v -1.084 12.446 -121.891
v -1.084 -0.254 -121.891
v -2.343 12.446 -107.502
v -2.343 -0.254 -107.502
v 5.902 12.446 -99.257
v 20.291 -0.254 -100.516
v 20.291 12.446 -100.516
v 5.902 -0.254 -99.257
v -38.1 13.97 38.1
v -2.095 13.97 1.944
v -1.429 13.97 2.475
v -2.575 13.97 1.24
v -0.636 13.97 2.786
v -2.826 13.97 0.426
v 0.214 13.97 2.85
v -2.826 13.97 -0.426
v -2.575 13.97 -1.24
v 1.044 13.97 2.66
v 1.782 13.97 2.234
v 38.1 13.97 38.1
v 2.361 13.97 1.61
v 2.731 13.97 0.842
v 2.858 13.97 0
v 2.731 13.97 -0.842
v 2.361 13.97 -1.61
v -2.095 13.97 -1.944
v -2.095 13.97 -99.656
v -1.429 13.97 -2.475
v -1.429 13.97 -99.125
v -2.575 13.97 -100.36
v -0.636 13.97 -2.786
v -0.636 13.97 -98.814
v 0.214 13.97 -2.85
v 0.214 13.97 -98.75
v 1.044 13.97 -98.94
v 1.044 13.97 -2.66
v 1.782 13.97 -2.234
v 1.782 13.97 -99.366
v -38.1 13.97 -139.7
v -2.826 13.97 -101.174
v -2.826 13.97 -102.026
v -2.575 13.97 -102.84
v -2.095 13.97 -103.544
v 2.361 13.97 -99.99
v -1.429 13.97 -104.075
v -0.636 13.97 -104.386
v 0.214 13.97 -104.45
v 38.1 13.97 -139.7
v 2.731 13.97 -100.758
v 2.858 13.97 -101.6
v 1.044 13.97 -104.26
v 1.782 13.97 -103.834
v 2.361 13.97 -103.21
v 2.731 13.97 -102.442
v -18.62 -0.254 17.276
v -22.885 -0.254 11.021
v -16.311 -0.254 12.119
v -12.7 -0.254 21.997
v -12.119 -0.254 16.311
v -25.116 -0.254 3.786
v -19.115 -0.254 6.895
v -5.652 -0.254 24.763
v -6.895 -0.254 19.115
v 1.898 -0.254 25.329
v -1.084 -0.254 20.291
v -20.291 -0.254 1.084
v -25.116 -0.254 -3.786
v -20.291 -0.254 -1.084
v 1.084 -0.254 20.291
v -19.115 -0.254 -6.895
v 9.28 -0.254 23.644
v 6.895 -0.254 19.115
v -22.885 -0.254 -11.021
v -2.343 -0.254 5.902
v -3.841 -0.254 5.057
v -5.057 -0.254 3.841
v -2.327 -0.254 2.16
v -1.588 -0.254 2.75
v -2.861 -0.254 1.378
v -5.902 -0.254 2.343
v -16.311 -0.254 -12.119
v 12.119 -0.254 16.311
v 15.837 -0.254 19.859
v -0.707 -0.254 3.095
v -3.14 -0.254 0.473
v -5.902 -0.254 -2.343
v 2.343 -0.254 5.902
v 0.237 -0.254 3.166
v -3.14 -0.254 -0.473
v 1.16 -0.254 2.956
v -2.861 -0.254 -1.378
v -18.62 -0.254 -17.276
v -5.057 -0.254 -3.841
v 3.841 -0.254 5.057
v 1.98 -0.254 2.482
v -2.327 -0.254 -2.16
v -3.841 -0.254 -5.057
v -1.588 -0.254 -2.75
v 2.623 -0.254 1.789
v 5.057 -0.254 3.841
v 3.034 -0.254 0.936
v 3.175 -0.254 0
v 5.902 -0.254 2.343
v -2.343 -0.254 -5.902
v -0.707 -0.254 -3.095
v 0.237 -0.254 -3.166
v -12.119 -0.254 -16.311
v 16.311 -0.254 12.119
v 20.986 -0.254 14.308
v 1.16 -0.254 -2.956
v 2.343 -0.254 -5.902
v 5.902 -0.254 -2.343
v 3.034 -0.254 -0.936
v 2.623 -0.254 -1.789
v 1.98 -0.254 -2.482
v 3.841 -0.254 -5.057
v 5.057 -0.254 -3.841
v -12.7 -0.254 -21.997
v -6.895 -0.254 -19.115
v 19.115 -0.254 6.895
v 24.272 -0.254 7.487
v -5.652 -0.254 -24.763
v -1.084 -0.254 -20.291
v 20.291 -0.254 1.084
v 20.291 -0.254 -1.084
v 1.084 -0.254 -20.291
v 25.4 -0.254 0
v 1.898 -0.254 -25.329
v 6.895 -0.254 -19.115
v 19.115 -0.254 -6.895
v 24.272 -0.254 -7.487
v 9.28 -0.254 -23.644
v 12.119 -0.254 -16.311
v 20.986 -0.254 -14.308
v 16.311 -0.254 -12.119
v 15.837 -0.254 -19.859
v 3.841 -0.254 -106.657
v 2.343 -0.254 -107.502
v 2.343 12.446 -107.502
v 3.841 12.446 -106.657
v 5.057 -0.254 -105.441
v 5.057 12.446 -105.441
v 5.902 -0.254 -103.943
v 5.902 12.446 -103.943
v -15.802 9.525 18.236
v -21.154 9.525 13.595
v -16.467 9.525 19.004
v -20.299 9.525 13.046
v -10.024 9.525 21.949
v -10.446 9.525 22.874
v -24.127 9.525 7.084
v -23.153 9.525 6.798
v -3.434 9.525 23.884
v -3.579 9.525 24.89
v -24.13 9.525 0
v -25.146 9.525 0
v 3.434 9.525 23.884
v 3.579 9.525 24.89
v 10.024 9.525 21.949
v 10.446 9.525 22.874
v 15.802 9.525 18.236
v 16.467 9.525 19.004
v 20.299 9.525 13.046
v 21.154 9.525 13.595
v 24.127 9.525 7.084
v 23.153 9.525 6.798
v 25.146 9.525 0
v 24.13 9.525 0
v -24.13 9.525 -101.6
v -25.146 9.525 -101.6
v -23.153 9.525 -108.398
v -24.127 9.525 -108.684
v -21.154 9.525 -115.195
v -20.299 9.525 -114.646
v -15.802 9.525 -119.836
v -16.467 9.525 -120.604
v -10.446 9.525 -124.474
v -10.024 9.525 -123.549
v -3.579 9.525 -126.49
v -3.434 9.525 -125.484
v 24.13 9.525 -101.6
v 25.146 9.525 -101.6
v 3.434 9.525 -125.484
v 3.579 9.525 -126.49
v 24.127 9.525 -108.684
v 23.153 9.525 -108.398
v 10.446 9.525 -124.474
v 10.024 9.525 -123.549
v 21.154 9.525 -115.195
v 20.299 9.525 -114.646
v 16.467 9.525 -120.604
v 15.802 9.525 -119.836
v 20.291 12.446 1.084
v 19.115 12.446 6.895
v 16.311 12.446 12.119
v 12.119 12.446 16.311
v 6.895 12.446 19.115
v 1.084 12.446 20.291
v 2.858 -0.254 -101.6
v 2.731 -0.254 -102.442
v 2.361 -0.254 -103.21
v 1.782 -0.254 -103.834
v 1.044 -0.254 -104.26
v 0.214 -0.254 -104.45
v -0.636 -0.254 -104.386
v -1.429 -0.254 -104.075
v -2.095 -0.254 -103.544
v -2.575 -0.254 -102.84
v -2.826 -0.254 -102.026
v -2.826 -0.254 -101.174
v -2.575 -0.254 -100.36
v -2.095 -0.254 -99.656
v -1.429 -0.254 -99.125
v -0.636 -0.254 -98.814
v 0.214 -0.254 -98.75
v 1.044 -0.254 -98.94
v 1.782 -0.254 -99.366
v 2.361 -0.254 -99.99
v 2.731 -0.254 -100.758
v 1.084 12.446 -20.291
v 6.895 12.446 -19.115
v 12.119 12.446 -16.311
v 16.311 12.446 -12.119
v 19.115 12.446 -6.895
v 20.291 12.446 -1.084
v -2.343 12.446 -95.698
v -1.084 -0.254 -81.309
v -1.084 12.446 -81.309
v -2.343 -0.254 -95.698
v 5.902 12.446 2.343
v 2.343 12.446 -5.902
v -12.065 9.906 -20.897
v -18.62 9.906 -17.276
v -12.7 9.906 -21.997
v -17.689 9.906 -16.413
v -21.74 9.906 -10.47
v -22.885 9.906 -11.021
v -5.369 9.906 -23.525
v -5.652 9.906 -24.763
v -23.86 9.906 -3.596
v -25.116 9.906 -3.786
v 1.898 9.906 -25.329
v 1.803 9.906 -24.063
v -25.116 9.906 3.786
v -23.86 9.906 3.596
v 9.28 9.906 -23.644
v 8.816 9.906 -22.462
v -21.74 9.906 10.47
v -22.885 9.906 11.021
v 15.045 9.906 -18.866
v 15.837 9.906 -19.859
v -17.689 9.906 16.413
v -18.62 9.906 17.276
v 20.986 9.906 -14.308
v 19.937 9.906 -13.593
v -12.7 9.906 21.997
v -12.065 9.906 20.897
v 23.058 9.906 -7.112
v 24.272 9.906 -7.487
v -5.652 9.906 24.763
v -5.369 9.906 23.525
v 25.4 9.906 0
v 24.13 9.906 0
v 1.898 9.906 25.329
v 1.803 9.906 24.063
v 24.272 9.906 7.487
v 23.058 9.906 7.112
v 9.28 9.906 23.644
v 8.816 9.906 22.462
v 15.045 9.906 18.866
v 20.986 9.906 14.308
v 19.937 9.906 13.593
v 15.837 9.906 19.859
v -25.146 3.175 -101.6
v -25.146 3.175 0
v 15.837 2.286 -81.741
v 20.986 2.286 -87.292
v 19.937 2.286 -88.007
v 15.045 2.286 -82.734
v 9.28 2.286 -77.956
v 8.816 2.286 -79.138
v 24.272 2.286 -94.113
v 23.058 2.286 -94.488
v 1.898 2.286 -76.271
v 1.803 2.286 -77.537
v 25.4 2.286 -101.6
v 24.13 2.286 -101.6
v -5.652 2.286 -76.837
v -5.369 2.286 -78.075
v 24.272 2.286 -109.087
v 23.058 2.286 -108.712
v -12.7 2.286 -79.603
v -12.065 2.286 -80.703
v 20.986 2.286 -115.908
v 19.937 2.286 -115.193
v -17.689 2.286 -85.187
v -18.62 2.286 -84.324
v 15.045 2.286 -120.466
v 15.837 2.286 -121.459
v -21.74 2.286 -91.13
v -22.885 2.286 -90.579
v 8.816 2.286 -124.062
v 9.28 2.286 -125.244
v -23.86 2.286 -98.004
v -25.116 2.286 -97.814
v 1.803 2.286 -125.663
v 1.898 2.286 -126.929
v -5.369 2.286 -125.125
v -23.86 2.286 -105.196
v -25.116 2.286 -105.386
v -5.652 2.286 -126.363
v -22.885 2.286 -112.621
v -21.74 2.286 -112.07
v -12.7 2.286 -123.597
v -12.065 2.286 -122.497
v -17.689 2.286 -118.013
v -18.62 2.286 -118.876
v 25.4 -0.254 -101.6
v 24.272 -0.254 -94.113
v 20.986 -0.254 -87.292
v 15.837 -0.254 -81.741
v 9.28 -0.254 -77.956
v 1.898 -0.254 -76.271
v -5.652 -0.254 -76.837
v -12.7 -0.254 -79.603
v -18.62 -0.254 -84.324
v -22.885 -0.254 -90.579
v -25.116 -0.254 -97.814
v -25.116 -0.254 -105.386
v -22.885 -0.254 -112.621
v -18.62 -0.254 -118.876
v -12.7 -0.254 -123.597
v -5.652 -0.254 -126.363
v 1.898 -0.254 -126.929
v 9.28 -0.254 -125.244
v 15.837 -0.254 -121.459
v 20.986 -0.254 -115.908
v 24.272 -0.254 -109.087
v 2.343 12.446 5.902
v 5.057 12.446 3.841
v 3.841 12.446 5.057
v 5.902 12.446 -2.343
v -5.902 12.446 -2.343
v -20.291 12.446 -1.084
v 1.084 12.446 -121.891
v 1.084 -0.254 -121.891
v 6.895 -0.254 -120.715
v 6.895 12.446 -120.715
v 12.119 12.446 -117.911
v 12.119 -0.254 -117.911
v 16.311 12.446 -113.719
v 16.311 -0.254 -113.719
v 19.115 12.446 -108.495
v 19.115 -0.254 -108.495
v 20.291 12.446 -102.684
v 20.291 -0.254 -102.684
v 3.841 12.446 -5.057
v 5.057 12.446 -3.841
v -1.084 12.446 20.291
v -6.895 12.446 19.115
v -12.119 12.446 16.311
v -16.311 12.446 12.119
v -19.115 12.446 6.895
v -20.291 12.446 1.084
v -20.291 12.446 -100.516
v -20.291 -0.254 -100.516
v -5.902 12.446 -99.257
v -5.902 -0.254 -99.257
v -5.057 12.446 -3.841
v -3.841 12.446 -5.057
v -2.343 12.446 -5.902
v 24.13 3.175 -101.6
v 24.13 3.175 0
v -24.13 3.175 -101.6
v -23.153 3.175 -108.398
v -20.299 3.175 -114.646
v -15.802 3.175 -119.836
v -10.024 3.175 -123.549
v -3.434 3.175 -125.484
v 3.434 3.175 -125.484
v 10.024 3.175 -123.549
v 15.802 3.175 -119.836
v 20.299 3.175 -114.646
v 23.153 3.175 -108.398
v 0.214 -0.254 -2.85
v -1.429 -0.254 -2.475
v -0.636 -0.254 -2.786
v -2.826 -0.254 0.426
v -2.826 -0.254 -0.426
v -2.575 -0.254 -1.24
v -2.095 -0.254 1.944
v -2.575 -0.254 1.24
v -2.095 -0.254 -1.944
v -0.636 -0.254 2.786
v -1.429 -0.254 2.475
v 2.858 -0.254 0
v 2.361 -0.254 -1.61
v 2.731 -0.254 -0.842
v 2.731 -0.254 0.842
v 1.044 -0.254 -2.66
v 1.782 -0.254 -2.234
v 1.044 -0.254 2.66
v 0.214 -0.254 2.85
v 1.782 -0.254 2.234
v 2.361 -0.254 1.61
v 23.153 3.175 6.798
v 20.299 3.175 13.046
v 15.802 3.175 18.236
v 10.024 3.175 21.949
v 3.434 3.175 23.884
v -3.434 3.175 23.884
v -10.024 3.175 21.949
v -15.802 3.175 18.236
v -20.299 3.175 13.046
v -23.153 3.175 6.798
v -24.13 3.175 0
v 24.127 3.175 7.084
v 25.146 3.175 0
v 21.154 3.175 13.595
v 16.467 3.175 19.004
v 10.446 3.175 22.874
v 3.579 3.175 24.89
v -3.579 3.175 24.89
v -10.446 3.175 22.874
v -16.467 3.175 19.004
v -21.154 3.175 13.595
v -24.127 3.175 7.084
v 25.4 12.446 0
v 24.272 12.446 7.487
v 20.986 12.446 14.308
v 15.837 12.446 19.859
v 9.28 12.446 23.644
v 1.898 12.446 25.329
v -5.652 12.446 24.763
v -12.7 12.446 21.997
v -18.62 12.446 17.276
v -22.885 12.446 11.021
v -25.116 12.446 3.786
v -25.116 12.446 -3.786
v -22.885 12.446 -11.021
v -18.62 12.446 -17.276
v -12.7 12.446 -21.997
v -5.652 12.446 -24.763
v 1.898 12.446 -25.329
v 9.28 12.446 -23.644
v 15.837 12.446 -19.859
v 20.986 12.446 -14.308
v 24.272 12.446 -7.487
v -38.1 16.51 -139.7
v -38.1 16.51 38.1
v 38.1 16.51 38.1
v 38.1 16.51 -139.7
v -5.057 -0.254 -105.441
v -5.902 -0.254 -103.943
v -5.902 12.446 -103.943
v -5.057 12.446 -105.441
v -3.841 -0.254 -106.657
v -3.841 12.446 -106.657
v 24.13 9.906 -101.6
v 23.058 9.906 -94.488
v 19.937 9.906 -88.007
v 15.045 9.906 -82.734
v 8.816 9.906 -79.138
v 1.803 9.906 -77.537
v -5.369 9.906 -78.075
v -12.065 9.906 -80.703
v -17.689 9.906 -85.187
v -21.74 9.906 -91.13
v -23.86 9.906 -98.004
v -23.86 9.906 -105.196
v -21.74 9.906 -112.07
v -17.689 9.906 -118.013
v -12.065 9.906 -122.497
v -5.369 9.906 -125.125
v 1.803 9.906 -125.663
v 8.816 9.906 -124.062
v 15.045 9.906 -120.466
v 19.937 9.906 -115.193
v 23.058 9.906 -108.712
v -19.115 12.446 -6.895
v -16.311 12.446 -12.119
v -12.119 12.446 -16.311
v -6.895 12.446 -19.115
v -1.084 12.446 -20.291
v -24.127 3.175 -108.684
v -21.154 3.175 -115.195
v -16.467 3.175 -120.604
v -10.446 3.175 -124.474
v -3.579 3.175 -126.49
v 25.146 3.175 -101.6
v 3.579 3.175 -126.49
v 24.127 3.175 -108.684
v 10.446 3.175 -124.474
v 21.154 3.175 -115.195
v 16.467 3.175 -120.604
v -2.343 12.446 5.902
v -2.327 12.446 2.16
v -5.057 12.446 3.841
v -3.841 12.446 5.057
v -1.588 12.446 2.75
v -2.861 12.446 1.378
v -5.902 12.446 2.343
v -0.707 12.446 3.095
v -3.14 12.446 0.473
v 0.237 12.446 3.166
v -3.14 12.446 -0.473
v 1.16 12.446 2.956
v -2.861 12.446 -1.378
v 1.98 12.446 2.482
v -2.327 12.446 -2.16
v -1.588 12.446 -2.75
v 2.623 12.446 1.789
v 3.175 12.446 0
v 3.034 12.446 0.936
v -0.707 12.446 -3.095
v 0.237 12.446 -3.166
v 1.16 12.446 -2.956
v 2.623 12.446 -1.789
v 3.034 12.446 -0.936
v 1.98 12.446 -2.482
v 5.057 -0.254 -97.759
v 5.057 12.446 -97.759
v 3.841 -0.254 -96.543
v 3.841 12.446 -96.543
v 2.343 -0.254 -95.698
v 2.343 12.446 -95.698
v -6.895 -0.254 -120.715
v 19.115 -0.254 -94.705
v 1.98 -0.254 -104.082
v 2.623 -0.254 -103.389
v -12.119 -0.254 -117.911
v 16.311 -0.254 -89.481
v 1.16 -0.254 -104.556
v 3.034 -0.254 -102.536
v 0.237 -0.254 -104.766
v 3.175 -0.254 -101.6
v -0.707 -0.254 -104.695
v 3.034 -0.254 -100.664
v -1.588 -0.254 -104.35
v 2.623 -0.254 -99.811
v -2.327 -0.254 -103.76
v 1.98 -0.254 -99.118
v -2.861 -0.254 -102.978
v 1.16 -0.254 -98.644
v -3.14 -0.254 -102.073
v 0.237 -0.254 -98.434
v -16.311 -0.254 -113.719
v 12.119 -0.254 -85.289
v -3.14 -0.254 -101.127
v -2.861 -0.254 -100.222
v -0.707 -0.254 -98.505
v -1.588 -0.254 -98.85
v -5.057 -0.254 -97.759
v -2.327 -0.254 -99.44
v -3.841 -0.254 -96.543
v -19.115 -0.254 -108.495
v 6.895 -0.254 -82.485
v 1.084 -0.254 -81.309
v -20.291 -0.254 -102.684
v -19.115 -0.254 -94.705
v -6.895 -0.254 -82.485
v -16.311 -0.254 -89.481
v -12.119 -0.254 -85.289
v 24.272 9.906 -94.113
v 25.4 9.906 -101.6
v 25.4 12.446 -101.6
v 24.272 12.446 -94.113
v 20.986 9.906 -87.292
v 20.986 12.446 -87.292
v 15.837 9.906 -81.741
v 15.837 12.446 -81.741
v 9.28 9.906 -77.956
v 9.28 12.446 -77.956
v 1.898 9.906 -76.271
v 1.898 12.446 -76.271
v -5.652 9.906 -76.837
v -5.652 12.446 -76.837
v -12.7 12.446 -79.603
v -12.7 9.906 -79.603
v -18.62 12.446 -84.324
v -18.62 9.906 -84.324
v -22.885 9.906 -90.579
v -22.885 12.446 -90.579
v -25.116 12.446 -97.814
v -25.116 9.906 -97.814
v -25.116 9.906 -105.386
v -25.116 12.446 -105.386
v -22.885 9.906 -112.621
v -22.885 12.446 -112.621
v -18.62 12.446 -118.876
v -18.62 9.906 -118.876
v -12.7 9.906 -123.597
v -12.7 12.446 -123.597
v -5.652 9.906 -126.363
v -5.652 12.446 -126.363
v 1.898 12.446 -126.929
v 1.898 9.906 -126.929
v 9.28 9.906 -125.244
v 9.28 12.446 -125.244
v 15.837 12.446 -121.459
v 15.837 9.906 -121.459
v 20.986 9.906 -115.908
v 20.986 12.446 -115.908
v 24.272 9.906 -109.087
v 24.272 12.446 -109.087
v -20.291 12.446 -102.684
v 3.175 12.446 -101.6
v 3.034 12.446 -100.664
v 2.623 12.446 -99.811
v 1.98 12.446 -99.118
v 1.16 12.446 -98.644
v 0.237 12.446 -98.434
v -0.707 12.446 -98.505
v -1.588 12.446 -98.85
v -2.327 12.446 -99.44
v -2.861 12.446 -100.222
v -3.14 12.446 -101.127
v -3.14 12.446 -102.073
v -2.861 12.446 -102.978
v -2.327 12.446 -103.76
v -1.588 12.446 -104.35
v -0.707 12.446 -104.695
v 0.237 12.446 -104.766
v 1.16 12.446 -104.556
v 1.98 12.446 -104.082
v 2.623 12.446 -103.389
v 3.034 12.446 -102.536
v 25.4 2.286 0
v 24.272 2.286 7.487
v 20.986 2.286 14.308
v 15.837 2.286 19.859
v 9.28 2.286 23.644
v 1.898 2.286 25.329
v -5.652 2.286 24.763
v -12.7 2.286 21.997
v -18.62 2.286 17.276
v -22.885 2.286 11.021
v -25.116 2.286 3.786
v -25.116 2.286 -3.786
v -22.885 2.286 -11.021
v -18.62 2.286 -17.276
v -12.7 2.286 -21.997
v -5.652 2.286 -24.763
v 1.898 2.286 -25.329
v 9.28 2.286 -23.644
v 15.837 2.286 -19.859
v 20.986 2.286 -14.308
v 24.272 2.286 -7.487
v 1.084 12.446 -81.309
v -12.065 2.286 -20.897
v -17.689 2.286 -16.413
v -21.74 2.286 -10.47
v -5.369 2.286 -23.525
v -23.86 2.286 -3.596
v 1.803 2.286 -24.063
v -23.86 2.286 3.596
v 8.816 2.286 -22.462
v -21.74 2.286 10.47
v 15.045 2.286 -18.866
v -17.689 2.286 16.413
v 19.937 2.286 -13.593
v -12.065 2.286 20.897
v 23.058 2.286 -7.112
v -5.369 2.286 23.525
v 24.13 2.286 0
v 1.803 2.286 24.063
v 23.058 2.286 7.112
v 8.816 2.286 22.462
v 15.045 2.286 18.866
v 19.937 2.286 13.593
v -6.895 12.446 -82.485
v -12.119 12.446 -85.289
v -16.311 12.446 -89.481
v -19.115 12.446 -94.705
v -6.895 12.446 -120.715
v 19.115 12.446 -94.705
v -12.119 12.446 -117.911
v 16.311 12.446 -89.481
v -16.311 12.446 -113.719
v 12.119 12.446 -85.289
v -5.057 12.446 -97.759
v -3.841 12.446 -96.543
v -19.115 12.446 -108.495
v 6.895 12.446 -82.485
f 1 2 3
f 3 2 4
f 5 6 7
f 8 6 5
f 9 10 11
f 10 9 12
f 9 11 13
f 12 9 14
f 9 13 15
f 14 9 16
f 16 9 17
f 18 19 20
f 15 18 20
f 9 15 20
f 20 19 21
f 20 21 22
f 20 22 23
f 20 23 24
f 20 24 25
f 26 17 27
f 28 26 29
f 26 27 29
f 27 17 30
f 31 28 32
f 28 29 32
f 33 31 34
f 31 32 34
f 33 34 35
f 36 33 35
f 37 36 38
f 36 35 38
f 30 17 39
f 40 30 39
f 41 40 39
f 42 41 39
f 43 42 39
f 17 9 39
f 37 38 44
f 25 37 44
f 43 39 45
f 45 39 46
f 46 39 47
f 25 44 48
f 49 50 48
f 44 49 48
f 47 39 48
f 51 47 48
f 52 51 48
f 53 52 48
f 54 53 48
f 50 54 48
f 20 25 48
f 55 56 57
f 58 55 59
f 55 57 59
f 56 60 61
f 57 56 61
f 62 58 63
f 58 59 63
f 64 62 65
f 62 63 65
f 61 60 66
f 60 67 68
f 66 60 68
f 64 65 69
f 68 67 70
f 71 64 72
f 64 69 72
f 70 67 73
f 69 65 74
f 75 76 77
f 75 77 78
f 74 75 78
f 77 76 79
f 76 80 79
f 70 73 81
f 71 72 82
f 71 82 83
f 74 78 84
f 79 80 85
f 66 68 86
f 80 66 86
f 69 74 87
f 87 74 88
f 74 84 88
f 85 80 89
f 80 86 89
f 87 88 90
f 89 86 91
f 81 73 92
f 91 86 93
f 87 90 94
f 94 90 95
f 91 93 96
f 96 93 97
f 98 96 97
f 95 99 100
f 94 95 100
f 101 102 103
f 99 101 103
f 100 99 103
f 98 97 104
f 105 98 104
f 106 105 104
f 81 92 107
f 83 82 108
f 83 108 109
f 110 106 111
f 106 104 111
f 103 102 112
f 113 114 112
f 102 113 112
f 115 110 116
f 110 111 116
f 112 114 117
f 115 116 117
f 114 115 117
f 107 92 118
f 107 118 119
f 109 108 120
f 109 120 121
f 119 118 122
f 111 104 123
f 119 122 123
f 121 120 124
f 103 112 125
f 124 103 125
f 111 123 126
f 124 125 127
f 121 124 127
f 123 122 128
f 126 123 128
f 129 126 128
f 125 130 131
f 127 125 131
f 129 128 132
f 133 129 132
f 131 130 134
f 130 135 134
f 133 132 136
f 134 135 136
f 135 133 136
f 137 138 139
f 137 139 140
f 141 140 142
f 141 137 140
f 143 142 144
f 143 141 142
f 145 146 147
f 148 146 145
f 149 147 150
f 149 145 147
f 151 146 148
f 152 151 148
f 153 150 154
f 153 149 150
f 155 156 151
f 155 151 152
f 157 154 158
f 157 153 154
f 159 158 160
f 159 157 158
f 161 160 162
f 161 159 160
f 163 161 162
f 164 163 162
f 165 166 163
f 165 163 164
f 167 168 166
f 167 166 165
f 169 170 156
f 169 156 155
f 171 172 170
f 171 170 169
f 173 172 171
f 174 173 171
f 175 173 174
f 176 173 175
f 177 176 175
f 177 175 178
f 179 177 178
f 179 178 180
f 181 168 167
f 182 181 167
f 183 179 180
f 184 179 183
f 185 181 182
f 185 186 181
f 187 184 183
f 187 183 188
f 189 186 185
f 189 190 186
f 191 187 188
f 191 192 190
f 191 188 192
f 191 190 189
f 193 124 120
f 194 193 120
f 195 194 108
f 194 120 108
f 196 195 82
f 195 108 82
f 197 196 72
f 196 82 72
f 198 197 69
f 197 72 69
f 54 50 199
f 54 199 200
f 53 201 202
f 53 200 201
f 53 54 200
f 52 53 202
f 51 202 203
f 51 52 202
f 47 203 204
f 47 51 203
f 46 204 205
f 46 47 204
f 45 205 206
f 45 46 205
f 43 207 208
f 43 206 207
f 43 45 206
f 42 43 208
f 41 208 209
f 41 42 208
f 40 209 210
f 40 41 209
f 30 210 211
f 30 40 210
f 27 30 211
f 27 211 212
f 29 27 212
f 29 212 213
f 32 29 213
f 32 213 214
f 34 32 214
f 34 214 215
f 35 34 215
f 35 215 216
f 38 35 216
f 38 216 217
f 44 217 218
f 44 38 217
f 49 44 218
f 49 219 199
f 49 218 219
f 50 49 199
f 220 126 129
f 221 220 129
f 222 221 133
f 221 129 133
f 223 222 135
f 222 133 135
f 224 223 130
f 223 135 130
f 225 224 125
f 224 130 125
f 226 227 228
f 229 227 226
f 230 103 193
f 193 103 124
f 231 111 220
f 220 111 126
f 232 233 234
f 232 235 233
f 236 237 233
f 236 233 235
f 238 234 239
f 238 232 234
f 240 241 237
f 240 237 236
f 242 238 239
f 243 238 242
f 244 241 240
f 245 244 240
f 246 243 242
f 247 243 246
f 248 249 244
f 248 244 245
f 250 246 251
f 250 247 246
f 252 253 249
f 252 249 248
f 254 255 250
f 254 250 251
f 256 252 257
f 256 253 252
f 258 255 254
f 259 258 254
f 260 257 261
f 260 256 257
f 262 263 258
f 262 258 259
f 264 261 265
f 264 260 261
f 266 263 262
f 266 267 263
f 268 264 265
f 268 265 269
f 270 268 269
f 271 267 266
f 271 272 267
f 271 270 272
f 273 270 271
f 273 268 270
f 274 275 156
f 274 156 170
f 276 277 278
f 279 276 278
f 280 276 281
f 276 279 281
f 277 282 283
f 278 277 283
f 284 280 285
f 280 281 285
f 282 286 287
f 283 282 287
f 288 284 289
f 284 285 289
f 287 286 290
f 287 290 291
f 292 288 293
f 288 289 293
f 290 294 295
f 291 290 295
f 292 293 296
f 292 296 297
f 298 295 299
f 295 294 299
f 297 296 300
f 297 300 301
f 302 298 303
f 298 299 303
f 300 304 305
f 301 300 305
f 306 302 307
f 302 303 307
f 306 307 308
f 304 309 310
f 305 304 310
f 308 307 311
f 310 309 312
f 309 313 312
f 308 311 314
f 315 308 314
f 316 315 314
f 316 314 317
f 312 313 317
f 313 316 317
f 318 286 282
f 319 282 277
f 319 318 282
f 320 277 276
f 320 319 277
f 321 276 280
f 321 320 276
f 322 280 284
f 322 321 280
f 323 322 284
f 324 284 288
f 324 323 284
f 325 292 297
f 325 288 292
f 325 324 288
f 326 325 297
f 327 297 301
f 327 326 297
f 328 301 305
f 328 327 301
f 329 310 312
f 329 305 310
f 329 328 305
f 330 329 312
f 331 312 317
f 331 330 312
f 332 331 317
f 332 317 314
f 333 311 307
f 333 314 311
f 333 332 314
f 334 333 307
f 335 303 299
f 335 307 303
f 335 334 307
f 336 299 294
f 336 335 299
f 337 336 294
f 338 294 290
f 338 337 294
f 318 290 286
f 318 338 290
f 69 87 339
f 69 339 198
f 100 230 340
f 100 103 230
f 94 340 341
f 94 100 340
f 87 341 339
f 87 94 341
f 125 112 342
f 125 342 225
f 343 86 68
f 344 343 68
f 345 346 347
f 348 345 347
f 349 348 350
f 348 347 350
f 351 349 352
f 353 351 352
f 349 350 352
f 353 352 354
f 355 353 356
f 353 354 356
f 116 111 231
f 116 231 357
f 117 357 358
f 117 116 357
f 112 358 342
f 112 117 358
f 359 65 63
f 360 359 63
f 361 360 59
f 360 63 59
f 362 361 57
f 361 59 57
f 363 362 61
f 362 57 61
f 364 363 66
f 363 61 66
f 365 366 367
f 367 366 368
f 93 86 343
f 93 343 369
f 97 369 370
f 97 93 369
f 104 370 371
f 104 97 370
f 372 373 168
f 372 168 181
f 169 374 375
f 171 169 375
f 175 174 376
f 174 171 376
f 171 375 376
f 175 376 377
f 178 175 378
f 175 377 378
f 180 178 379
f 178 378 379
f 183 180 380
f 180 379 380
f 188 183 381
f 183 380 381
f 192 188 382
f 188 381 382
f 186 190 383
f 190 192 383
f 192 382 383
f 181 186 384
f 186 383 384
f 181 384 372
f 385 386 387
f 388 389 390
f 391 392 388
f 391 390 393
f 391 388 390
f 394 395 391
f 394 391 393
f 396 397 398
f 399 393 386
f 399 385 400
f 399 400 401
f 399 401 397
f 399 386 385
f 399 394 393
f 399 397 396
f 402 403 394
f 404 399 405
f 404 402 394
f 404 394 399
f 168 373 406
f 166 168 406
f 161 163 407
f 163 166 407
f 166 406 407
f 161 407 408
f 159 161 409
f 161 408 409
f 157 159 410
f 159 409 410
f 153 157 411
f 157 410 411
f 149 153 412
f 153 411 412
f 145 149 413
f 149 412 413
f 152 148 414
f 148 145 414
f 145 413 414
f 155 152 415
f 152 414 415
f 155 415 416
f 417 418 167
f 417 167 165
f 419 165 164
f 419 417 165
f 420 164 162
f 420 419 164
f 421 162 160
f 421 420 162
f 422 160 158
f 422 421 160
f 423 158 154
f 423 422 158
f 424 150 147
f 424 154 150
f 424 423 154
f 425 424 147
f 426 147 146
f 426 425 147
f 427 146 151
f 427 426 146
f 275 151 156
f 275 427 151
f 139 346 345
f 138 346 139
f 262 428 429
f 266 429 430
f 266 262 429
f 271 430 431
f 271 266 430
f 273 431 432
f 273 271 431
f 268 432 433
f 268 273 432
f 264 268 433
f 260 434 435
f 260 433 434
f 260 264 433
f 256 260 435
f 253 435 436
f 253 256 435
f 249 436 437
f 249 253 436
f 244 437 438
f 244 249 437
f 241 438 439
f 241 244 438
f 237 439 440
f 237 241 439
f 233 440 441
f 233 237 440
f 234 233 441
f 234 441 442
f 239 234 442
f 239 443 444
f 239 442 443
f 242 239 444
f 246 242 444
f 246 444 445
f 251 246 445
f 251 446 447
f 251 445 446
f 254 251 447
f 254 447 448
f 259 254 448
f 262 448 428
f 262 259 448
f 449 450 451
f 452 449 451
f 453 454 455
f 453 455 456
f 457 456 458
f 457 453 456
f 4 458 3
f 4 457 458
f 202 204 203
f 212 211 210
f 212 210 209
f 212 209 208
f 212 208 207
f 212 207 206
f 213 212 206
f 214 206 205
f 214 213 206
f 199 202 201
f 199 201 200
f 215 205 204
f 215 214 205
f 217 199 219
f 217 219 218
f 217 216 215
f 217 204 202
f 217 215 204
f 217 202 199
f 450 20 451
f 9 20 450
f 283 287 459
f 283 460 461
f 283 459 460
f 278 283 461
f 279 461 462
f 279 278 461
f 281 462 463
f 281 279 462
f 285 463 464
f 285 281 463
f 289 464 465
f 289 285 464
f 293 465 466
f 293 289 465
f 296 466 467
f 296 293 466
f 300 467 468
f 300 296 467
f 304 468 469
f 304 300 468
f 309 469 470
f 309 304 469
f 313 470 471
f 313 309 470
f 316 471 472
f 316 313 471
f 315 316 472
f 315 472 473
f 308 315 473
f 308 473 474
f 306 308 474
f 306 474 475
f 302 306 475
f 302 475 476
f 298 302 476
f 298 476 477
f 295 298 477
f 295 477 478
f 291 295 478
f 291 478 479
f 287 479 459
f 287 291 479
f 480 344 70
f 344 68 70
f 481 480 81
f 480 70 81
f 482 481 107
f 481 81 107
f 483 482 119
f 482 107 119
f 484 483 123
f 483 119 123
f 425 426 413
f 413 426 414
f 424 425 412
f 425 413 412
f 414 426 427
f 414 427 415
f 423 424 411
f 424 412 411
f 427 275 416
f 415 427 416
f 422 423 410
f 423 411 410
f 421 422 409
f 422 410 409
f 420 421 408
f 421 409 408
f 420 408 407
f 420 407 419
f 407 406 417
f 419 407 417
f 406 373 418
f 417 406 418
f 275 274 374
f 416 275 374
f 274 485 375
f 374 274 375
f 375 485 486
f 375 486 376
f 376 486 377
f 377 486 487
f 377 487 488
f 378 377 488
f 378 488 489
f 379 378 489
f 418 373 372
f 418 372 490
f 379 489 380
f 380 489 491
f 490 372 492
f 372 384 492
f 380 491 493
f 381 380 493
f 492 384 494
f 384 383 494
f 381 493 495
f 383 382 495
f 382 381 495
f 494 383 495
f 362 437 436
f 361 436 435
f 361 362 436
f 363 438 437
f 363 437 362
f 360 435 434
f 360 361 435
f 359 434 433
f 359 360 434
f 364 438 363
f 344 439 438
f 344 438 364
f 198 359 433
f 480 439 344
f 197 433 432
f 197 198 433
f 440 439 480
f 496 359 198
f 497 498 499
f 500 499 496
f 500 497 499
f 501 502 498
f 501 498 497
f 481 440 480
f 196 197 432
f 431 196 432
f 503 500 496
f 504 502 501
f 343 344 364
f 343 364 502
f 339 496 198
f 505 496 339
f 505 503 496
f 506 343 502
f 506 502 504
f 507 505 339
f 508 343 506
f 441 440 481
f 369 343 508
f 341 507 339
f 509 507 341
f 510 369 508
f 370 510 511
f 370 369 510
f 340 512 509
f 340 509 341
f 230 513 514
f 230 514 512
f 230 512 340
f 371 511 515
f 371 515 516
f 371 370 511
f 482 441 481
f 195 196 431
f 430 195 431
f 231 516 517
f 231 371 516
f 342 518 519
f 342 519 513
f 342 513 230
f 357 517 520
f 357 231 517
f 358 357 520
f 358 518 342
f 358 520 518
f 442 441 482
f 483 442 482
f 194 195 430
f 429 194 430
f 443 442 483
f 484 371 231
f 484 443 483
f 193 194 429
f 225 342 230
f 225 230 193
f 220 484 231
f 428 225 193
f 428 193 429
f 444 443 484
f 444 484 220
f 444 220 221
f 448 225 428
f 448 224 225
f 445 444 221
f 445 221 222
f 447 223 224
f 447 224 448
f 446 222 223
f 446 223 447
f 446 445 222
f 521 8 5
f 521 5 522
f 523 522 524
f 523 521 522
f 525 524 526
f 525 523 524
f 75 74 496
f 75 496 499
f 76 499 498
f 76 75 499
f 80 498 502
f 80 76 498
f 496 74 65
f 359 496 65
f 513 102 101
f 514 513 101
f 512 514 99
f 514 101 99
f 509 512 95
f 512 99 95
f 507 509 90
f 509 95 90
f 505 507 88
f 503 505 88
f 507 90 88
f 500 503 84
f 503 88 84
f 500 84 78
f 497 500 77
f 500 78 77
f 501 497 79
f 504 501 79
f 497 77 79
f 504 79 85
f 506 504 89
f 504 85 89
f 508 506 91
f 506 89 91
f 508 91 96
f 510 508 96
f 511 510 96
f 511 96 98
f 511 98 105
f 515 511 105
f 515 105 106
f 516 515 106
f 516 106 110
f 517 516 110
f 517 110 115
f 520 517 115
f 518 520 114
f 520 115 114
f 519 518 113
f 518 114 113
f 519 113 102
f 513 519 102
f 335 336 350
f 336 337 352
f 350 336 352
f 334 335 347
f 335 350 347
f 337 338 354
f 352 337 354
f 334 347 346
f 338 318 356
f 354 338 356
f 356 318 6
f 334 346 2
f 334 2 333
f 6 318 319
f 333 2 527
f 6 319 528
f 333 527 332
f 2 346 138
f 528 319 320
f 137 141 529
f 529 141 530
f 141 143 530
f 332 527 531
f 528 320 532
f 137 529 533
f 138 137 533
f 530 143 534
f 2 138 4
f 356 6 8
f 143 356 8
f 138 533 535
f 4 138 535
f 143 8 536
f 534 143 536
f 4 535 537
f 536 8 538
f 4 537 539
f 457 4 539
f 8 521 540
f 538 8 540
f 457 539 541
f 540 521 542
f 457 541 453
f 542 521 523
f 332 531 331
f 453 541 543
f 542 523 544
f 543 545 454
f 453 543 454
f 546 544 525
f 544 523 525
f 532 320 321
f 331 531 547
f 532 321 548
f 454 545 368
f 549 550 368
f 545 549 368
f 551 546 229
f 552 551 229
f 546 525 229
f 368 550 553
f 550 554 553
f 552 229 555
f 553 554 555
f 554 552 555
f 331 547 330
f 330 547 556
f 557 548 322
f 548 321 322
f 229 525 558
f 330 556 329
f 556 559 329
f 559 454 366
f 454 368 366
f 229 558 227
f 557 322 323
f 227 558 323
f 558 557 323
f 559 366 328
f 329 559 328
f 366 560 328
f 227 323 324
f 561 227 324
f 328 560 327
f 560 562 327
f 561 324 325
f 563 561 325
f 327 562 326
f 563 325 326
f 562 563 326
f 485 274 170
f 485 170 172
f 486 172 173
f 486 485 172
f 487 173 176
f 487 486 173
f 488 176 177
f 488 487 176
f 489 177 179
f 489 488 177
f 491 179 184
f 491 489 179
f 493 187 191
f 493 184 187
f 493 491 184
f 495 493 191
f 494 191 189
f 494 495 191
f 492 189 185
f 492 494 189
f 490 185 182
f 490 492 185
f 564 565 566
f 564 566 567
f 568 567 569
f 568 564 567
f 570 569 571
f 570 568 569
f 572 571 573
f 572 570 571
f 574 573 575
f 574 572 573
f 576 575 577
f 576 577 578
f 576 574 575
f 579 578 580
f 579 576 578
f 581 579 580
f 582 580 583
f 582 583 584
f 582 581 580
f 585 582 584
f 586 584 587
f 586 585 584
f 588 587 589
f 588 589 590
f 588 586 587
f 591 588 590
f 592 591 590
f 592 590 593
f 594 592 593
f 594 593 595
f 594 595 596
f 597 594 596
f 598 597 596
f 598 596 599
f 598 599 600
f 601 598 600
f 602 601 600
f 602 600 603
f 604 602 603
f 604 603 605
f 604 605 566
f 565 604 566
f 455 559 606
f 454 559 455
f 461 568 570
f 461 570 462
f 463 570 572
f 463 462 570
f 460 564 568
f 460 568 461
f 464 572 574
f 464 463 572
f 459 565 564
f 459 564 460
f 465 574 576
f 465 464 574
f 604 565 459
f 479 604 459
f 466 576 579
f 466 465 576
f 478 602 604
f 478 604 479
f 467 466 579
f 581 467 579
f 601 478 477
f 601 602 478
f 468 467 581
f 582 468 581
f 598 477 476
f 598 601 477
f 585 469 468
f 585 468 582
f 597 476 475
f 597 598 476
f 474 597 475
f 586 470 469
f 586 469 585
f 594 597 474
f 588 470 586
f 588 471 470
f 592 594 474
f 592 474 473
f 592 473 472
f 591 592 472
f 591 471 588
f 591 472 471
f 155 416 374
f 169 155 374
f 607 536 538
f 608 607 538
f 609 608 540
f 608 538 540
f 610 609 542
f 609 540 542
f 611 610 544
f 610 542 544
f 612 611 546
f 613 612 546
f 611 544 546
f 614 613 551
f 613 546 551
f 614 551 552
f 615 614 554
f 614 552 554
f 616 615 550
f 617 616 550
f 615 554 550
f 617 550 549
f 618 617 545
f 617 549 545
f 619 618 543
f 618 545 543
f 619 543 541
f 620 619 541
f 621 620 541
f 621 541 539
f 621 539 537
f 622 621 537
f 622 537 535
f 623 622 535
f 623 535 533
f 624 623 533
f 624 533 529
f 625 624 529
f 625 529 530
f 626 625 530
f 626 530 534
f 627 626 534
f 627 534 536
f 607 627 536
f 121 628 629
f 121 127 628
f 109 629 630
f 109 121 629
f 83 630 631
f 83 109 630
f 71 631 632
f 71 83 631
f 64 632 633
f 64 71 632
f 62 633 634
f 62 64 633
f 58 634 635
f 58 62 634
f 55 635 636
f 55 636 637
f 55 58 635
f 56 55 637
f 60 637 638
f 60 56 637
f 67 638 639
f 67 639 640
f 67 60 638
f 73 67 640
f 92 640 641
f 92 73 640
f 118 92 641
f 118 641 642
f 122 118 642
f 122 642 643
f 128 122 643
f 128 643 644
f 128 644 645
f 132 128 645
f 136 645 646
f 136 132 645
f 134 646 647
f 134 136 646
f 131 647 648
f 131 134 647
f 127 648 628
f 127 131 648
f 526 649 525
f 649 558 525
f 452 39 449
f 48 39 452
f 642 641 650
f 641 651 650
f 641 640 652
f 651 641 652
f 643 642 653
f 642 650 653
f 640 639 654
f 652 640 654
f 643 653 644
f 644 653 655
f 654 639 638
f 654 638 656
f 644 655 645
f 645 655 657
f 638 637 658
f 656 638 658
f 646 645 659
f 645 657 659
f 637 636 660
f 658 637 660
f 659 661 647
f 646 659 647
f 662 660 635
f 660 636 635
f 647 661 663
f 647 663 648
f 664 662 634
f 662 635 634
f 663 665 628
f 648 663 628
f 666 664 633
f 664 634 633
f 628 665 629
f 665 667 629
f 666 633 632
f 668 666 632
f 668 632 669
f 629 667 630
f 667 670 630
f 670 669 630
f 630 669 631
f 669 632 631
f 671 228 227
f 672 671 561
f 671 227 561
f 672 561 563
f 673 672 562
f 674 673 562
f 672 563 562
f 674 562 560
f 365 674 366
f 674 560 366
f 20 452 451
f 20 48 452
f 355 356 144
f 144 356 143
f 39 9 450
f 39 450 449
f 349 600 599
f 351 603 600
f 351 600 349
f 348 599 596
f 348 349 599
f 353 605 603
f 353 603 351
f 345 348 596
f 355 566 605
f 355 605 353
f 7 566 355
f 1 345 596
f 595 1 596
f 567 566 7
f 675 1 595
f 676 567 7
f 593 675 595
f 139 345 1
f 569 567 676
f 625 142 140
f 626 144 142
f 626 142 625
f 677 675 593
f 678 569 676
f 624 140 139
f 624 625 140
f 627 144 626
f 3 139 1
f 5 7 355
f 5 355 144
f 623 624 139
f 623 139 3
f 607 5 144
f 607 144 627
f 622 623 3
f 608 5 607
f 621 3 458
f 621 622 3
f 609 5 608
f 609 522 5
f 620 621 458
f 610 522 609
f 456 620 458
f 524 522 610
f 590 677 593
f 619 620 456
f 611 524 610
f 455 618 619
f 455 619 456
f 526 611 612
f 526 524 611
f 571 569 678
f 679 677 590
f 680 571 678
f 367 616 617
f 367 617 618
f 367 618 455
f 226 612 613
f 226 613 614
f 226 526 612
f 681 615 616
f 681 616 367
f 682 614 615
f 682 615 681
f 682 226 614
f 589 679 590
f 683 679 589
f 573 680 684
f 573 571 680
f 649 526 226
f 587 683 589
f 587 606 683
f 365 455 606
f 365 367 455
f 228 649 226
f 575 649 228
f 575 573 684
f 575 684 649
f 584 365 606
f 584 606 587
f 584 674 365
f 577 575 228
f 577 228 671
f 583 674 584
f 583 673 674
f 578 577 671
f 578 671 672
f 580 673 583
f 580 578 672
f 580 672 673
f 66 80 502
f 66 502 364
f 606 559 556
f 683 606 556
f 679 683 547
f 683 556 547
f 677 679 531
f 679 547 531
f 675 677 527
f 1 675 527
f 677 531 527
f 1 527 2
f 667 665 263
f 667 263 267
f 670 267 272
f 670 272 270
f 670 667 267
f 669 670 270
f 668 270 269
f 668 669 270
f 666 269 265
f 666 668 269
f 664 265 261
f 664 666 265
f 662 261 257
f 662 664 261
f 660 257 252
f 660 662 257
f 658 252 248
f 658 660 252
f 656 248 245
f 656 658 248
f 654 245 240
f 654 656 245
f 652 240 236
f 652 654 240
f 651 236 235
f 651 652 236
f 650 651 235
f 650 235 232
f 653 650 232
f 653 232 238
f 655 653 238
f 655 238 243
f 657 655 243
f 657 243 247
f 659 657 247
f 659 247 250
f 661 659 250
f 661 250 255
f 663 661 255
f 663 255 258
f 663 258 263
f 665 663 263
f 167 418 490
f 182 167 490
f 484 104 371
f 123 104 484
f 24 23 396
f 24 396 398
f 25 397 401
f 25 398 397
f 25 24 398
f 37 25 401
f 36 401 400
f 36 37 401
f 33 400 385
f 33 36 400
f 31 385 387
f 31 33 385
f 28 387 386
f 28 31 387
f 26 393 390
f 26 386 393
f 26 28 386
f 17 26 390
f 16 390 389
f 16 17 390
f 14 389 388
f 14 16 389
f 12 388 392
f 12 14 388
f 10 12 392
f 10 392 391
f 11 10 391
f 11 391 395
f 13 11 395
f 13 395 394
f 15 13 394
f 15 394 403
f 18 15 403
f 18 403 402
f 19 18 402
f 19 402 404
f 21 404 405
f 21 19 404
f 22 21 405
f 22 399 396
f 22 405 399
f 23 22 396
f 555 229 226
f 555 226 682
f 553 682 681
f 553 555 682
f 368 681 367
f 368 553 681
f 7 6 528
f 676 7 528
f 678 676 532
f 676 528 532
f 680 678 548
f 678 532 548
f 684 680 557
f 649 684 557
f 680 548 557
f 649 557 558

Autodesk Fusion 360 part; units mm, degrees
sketch "Sketch1" plane through (0, 0, 0) normal (0, 1, 0) x (1, 0, 0)
  circle A0 centre (0, 0) radius 25.4
  line L0 (-5.902, 2.3429) -> (-20.3281, 1.0808)
  line L1 (-5.902, 2.3429) -> (8.5793, 2.3429) construction
  line L2 (2.5, 0) -> (20, 0)
  line L3 (-5.902, -2.3429) -> (-20.3281, -1.0808)
  line L4 (2.3429, -5.902) -> (1.0808, -20.3281)
  line L5 (-2.3429, -5.902) -> (-1.0808, -20.3281)
  line L6 (5.902, 2.3429) -> (20.3281, 1.0808)
  line L7 (5.902, -2.3429) -> (20.3281, -1.0808)
  line L8 (-2.3429, 5.902) -> (-1.0808, 20.3281)
  line L9 (2.3429, 5.902) -> (1.0808, 20.3281)
  arc A1 (-20.2911, -1.0841) -> (-1.0841, -20.2911) centre (0, 0) ccw
  arc A2 (1.0841, -20.2911) -> (20.2911, -1.0841) centre (0, 0) ccw
  arc A3 (5.902, 2.3429) -> (2.3429, 5.902) centre (0, 0) ccw
  arc A4 (-2.3429, 5.902) -> (-5.902, 2.3429) centre (0, 0) ccw
  arc A5 (-5.902, -2.3429) -> (-2.3429, -5.902) centre (0, 0) ccw
  arc A6 (2.3429, -5.902) -> (5.902, -2.3429) centre (0, 0) ccw
  arc A7 (20.2911, 1.0841) -> (1.0841, 20.2911) centre (0, 0) ccw
  arc A8 (-1.0841, 20.2911) -> (-20.2911, 1.0841) centre (0, 0) ccw
  dimension "d1" = 50.8
  dimension "d3" = 12.7
  dimension "d4" = 175
  dimension "d6" = 360
extrude "Extrude1" add sketch "Sketch1" along normal blind 12.7 makes body 1
sketch "Sketch2" plane through (0, 0, 0) normal (0, -1, 0) x (1, 0, 0)
  line L0 (-2.3429, -5.902) -> (-1.0841, -20.2911)
  arc A0 (-20.2911, -1.0841) -> (-1.0841, -20.2911) centre (0, 0) ccw
  line L1 (-20.2911, -1.0841) -> (-5.902, -2.3429)
  arc A1 (-5.902, -2.3429) -> (-2.3429, -5.902) centre (0, 0) ccw
  line L2 (5.902, -2.3429) -> (20.2911, -1.0841)
  arc A2 (1.0841, -20.2911) -> (20.2911, -1.0841) centre (0, 0) ccw
  line L3 (1.0841, -20.2911) -> (2.3429, -5.902)
  arc A3 (2.3429, -5.902) -> (5.902, -2.3429) centre (0, 0) ccw
  arc A4 (20.2911, 1.0841) -> (1.0841, 20.2911) centre (0, 0) ccw
  line L4 (20.2911, 1.0841) -> (5.902, 2.3429)
  arc A5 (5.902, 2.3429) -> (2.3429, 5.902) centre (0, 0) ccw
  line L5 (2.3429, 5.902) -> (1.0841, 20.2911)
  arc A6 (-1.0841, 20.2911) -> (-20.2911, 1.0841) centre (0, 0) ccw
  line L6 (-1.0841, 20.2911) -> (-2.3429, 5.902)
  arc A7 (-2.3429, 5.902) -> (-5.902, 2.3429) centre (0, 0) ccw
  line L7 (-5.902, 2.3429) -> (-20.2911, 1.0841)
  circle A8 centre (0, 0) radius 25.4
  circle A9 centre (0, 0) radius 25.4
  circle A10 centre (0, 0) radius 24.13
  dimension "d9" = -1.27
extrude "Extrude2" cut sketch "Sketch2" against normal blind 7.62 from surface at -2.54 contours A8 A9 bodies 1
ref_plane "WorkPlane1" through (0, 0, -50.8) normal (0, 0, 1) x (1, 0, 0)
mirror "Mirror1" about plane through (0, 0, -50.8) normal (0, 0, 1) of bodies 1 makes body 2
ref_plane "WorkPlane2" through (0, 6.35, 0) normal (0, 1, 0) x (0, 0, 1)
sketch "Sketch3" plane through (0, 6.35, 0) normal (0, 1, 0) x (1, 0, 0)
  circle A0 centre (0, 0) radius 24.13
  circle A1 centre (0, 101.6) radius 24.13
  line L0 (0, 0) -> (-24.13, 0)
  line L1 (-24.13, 0) -> (-24.13, 101.6)
  line L2 (0, -20) -> (0, -2.5)
  line L3 (24.13, 0) -> (24.13, 101.6)
  arc A2 (-24.13, 0) -> (24.13, 0) centre (0, 0) ccw
  arc A3 (24.13, 101.6) -> (-24.13, 101.6) centre (0, 101.6) ccw
  arc A4 (-25.146, 0) -> (25.146, 0) centre (0, 0) ccw
  line L4 (25.146, 0) -> (25.146, 101.6)
  arc A5 (25.146, 101.6) -> (-25.146, 101.6) centre (0, 101.6) ccw
  line L5 (-25.146, 0) -> (-25.146, 101.6)
  dimension "d17" = 101.6
  dimension "d18" = -1.016
extrude "Extrude3" add sketch "Sketch3" along normal mid plane 6.35 separate body makes body 3
copy_body "Body->Comp1" bodies 3 removing the originals makes body 4 in component "Belt"
copy_body "Body->Comp2" bodies 1 removing the originals makes body 5 in component "Wheel1"
copy_body "Body->Comp3" bodies 2 removing the originals makes body 6 in component "Wheel2"
sketch "Sketch4" plane through (0, 0, 0) normal (0, -1, 0) x (1, 0, 0)
  line L0 (-2.3429, -5.902) -> (-1.0841, -20.2911)
  arc A0 (-20.2911, -1.0841) -> (-1.0841, -20.2911) centre (0, 0) ccw
  line L1 (-20.2911, -1.0841) -> (-5.902, -2.3429)
  arc A1 (-5.902, -2.3429) -> (-2.3429, -5.902) centre (0, 0) ccw
  line L2 (5.902, -2.3429) -> (20.2911, -1.0841)
  arc A2 (1.0841, -20.2911) -> (20.2911, -1.0841) centre (0, 0) ccw
  line L3 (1.0841, -20.2911) -> (2.3429, -5.902)
  arc A3 (2.3429, -5.902) -> (5.902, -2.3429) centre (0, 0) ccw
  arc A4 (20.2911, 1.0841) -> (1.0841, 20.2911) centre (0, 0) ccw
  line L4 (20.2911, 1.0841) -> (5.902, 2.3429)
  arc A5 (5.902, 2.3429) -> (2.3429, 5.902) centre (0, 0) ccw
  line L5 (2.3429, 5.902) -> (1.0841, 20.2911)
  arc A6 (-1.0841, 20.2911) -> (-20.2911, 1.0841) centre (0, 0) ccw
  line L6 (-1.0841, 20.2911) -> (-2.3429, 5.902)
  arc A7 (-2.3429, 5.902) -> (-5.902, 2.3429) centre (0, 0) ccw
  line L7 (-5.902, 2.3429) -> (-20.2911, 1.0841)
  circle A8 centre (0, 0) radius 25.4
  circle A9 centre (0, 0) radius 3.175
  line L8 (0.4291, -50.8) -> (12.4447, -50.8)
  circle A10 centre (0, -101.6) radius 3.175
  dimension "d21" = 6.35
extrude "Extrude1'" cut sketch "Sketch4" against normal up to surface (12.7 mm away) contours A9 | A10 bodies 5 in component "Wheel1"
extrude "Extrude1''" cut sketch "Sketch4" against normal up to surface (12.7 mm away) contours A9 | A10 bodies 6 in component "Wheel2"
ref_plane "WorkPlane3" through (0, 13.97, 0) normal (0, 1, 0) x (1, 0, 0)
sketch "Sketch5" plane through (0, 13.97, 0) normal (0, 1, 0) x (1, 0, 0)
  line L0 (38.1, -38.1) -> (-38.1, -38.1)
  line L1 (-38.1, -38.1) -> (-38.1, 139.7)
  line L2 (-38.1, 139.7) -> (38.1, 139.7)
  line L3 (38.1, 139.7) -> (38.1, -38.1)
extrude "Extrude4" add sketch "Sketch5" along normal blind 2.54 separate body makes body 7
sketch "Sketch6" plane through (0, 13.97, 0) normal (0, -1, 0) x (1, 0, 0)
  line L0 (-38.1, -139.7) -> (38.1, -139.7)
  line L1 (38.1, -139.7) -> (38.1, 38.1)
  line L2 (38.1, 38.1) -> (-38.1, 38.1)
  line L3 (-38.1, 38.1) -> (-38.1, -139.7)
  circle A0 centre (0, 0) radius 2.8575
  line L4 (0.4291, -50.8) -> (12.4447, -50.8)
  circle A1 centre (0, -101.6) radius 2.8575
  dimension "d29" = 5.715
extrude "Extrude5" add sketch "Sketch6" along normal blind 14.224 contours A0 | A1 bodies 7
copy_body "Body->Comp4" bodies 7 removing the originals makes body 8 in component "Backboard"
component "Belt" placed x (1, 0, 0) y (0, 1, 0) z (0, 0, 1) at (0, 0, 0)
component "Wheel1" placed x (1, 0, 0) y (0, 1, 0) z (0, 0, 1) at (0, -0.254, 0)
component "Wheel2" placed x (1, 0, 0) y (0, 1, 0) z (0, 0, 1) at (0, -0.254, 0)
component "Backboard" placed x (1, 0, 0) y (0, 1, 0) z (0, 0, 1) at (0, 0, 0)
